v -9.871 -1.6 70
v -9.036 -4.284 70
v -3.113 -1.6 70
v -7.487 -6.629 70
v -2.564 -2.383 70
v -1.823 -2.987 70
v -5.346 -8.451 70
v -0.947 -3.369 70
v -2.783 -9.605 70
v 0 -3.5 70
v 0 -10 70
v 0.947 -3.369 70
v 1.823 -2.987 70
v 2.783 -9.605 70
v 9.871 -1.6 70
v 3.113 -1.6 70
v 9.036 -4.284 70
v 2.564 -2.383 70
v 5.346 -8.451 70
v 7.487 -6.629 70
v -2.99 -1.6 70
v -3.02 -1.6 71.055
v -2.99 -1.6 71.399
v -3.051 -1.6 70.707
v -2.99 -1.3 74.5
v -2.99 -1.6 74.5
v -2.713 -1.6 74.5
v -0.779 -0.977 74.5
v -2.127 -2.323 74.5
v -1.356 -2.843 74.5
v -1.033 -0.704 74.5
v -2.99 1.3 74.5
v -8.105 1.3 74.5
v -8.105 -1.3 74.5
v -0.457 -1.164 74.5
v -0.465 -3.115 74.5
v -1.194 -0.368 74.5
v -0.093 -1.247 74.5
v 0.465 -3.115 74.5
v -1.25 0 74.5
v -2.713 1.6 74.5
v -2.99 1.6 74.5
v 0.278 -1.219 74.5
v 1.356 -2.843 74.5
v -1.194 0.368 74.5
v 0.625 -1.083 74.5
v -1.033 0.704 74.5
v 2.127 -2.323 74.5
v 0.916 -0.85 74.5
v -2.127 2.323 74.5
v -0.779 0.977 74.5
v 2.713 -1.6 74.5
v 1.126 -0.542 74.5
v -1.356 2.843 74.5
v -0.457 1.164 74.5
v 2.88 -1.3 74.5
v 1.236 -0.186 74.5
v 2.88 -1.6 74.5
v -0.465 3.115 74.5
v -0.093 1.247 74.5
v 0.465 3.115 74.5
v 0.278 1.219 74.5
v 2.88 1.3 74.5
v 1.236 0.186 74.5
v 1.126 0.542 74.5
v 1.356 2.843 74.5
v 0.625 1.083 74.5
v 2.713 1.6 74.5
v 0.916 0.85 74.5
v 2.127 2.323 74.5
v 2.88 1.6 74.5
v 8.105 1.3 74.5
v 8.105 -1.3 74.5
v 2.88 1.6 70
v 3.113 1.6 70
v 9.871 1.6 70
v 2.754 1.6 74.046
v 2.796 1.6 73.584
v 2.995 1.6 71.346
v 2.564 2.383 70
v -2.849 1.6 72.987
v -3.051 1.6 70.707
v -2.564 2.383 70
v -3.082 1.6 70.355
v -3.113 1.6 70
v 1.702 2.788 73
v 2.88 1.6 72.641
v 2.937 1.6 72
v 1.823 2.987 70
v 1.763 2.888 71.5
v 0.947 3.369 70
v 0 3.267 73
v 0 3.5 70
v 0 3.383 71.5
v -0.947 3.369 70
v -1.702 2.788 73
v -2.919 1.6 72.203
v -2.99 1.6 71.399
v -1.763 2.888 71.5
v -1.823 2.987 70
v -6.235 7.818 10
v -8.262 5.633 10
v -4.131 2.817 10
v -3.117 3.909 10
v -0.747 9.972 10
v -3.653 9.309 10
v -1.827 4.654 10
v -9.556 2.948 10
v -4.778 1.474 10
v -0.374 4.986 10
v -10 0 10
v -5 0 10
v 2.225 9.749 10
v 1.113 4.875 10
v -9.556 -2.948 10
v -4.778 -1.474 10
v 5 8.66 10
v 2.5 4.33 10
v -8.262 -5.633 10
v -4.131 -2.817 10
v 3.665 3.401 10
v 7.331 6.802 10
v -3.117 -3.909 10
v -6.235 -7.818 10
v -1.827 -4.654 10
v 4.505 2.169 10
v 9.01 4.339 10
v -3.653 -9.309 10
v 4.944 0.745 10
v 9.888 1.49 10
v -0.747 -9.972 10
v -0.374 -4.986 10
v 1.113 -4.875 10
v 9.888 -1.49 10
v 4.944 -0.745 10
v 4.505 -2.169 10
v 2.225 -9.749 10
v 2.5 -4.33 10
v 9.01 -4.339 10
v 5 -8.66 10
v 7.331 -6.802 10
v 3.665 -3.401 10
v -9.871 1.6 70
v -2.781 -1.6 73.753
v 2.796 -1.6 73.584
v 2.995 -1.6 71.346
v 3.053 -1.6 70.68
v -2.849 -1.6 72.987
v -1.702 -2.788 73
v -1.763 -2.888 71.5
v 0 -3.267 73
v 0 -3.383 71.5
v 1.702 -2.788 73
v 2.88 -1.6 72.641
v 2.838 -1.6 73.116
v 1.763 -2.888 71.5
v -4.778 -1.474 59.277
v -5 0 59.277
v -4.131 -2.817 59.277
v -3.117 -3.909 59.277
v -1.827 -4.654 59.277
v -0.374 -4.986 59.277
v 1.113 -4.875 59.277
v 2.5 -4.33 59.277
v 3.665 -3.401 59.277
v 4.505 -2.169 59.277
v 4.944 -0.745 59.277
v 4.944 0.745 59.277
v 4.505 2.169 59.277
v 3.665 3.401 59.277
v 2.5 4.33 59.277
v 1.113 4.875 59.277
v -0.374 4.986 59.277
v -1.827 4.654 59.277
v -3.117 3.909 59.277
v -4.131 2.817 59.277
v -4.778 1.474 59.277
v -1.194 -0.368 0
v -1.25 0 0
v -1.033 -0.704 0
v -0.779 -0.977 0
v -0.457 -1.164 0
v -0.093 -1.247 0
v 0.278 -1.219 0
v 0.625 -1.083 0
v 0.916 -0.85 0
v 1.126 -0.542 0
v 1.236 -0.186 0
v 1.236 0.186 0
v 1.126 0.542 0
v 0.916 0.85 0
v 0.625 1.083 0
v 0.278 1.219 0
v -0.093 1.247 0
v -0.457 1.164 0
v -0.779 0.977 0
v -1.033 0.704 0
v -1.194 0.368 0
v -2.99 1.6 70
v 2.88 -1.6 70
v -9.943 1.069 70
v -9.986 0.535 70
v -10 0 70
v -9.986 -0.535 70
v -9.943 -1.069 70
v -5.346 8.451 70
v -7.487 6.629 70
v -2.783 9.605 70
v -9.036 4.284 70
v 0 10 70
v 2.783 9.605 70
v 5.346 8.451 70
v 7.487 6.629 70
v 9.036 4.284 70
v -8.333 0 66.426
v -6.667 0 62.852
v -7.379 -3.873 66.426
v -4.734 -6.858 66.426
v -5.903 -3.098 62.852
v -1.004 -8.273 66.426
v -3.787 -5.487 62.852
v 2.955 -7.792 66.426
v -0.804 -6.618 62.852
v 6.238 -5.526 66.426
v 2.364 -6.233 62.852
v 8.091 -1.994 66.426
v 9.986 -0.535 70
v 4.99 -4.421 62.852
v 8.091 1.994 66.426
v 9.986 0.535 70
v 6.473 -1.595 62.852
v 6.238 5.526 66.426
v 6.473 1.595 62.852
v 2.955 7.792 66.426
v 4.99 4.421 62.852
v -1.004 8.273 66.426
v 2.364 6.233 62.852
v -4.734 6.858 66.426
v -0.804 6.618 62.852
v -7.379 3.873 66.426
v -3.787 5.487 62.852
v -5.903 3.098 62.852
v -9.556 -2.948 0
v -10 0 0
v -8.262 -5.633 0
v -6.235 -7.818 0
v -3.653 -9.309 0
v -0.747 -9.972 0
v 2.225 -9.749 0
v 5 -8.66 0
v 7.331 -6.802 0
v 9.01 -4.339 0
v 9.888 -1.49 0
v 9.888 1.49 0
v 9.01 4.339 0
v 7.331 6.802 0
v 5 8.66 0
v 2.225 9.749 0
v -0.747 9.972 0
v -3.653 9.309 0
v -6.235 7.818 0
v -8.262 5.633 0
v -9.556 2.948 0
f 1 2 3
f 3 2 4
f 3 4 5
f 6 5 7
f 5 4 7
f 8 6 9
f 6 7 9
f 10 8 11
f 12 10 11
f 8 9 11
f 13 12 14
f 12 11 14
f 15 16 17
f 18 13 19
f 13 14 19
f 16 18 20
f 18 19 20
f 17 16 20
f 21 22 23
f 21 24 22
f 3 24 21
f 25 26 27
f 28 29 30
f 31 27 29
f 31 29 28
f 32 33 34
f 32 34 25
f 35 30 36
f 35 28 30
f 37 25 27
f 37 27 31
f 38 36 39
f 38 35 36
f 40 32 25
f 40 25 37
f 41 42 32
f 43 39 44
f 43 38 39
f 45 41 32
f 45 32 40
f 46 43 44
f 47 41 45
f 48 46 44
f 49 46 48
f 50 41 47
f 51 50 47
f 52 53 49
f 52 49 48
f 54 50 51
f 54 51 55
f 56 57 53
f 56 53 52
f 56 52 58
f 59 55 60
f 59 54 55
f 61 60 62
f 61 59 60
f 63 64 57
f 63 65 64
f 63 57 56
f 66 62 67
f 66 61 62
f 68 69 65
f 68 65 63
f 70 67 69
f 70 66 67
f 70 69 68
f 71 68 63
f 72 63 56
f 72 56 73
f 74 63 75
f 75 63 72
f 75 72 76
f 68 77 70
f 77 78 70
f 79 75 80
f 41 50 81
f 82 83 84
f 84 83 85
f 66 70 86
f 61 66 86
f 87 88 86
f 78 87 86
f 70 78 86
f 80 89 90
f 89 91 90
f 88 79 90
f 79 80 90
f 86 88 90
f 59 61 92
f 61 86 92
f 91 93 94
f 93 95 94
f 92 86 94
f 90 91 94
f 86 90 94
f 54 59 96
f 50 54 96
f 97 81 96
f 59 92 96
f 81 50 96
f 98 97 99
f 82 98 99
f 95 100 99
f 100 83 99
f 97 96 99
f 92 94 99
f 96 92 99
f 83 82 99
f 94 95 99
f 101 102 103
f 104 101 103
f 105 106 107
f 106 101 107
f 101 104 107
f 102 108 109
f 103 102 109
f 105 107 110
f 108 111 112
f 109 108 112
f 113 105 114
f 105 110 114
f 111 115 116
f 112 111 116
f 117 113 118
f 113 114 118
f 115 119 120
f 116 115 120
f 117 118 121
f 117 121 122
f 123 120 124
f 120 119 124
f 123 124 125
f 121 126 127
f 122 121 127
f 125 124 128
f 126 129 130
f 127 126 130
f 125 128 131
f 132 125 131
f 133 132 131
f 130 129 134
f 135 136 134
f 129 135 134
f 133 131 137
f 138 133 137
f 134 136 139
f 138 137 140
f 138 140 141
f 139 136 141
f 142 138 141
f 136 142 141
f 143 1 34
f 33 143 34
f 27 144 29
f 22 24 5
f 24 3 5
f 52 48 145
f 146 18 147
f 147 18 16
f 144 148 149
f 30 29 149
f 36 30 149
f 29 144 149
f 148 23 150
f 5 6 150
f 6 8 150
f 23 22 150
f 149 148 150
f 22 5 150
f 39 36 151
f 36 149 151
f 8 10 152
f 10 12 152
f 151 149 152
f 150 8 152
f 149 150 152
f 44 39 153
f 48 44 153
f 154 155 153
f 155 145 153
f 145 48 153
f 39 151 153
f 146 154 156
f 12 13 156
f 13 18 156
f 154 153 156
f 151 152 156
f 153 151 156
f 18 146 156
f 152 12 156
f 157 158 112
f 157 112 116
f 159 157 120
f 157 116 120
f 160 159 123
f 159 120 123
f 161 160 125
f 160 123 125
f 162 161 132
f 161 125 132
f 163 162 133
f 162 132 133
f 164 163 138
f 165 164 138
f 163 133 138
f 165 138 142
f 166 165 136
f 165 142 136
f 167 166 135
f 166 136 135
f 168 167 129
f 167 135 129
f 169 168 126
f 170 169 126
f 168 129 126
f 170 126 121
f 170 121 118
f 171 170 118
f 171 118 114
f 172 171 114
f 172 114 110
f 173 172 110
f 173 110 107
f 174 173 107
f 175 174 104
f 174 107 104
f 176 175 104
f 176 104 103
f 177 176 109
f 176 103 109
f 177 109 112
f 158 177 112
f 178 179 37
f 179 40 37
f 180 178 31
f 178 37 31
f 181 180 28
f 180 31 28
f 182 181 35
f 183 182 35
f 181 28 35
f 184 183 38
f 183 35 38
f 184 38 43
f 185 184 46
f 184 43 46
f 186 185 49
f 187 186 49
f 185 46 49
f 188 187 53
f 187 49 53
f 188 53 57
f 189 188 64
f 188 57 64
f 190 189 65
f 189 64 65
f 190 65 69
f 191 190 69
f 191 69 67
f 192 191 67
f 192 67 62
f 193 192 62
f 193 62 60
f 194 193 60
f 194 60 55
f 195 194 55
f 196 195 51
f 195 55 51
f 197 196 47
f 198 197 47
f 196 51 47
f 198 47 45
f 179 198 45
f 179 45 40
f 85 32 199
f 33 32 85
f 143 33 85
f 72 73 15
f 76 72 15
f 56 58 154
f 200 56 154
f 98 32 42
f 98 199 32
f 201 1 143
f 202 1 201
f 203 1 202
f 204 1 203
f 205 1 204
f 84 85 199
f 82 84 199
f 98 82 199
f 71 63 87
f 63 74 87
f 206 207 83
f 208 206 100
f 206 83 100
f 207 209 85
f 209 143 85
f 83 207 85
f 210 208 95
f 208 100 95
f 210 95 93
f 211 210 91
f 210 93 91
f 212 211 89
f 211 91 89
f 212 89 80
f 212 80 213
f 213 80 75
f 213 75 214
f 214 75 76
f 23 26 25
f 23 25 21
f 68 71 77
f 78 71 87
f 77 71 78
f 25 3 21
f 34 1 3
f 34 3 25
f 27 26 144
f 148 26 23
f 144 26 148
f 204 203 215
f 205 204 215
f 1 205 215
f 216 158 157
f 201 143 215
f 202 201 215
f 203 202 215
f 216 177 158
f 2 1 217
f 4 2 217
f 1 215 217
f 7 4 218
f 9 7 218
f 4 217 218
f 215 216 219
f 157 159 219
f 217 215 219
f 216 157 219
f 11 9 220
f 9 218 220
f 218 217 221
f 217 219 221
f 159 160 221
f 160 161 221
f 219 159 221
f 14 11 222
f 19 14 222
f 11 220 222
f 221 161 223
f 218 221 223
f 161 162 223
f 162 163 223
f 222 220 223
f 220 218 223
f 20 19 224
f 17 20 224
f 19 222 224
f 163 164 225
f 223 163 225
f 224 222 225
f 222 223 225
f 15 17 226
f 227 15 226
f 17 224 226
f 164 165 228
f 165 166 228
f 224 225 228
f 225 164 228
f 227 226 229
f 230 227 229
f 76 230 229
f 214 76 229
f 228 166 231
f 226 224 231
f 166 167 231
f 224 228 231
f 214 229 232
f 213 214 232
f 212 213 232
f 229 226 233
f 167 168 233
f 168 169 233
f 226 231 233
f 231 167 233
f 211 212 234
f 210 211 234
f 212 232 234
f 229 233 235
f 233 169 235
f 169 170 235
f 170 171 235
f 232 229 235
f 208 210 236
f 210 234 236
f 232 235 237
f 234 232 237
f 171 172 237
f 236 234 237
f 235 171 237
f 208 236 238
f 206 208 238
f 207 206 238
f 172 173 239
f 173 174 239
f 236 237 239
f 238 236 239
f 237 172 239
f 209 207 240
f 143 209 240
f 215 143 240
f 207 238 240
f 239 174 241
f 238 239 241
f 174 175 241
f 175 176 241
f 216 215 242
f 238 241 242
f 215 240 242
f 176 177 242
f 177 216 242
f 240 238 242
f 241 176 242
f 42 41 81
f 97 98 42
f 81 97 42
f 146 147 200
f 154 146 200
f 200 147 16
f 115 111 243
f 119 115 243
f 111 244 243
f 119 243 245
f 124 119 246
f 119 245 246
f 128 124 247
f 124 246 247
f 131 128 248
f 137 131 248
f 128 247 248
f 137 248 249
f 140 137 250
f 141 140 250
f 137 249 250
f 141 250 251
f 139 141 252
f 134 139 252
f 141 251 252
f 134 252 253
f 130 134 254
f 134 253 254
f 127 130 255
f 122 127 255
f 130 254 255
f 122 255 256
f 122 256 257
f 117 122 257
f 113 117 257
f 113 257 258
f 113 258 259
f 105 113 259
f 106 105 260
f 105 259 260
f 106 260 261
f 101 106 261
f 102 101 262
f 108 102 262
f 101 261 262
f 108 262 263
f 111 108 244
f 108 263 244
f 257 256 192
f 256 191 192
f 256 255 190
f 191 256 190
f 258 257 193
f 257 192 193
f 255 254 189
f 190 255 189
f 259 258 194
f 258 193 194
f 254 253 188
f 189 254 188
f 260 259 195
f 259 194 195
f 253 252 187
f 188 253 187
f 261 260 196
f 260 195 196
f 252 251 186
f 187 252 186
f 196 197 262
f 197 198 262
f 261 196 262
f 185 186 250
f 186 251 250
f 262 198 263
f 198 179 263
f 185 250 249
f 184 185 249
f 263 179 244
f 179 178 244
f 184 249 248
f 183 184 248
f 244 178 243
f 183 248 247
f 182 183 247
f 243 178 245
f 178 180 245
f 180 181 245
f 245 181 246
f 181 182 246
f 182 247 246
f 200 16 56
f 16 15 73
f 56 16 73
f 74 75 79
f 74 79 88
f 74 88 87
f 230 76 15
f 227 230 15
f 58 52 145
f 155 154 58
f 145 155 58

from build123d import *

# Parameters (mm, degrees)
F3_DEPTH  = 4.5
F6_DEPTH  = 7.82
F9_DEPTH  = 7.71
F12_DEPTH = 25


with BuildPart() as f1:
    # F0 (on Front) → F1 (revolve)
    with BuildSketch(Plane.XZ):
        Polygon((-10, 0), (-1.25, 0), (-1.25, 74.5), (-3.15, 74.5), (-3.5, 70), (-10, 70), (-5, 59.2774653975), (-5, 10), (-10, 10), align=None)
    revolve(axis=Axis((0, 0, 54.2438514531), (0, 0, 1)))

    # F2 (on face) → F3 (join)
    with BuildSketch(Plane.XY.offset(70)):
        with BuildLine():
            Line((-3.1128764833, 1.6), (-9.8711701434, 1.6))
            ThreePointArc((-9.8711701434, 1.6), (-10, 0), (-9.8711701434, -1.6))
            Line((-9.8711701434, -1.6), (-3.1128764833, -1.6))
            Line((-3.1128764833, -1.6), (-2.7133927102, -1.6))
            ThreePointArc((-2.7133927102, -1.6), (-3.15, 0), (-2.7133927102, 1.6))
            Line((-2.7133927102, 1.6), (-3.1128764833, 1.6))
        make_face()
        with BuildLine():
            Line((9.8711701434, 1.6), (3.1128764833, 1.6))
            Line((3.1128764833, 1.6), (2.7133927102, 1.6))
            ThreePointArc((2.7133927102, 1.6), (3.15, 0), (2.7133927102, -1.6))
            Line((2.7133927102, -1.6), (3.1128764833, -1.6))
            Line((3.1128764833, -1.6), (9.8711701434, -1.6))
            ThreePointArc((9.8711701434, -1.6), (10, 0), (9.8711701434, 1.6))
        make_face()
    extrude(amount=F3_DEPTH)

    # F5 (on offset) → F6 (cut)
    with BuildSketch(Plane.YZ.offset(10.7)):
        Polygon((-1.6, 70), (-1.3, 74.5), (-1.6, 74.5), align=None)
        Polygon((1.6, 74.5), (1.3, 74.5), (1.6, 70), align=None)
    extrude(amount=-F6_DEPTH, mode=Mode.SUBTRACT)

    # F8 (on offset) → F9 (cut)
    with BuildSketch(Plane.YZ.offset(-10.7)):
        Polygon((1.6, 70), (1.6, 74.5), (1.3, 74.5), align=None)
        Polygon((-1.3, 74.5), (-1.6, 74.5), (-1.6, 70), align=None)
    extrude(amount=F9_DEPTH, mode=Mode.SUBTRACT)

    # F11 (on offset) → F12 (cut)
    with BuildSketch(Plane.XZ.offset(10)):
        Polygon((-10.2594941854, 70), (-9.8711701434, 70), (-7.9456651583, 74.9055147171), (-10.5508649722, 74.9055147171), align=None)
        Polygon((7.9456651583, 74.9055147171), (9.8711701434, 70), (10.2594941854, 70), (10.5508649722, 74.9055147171), align=None)
    extrude(amount=-F12_DEPTH, mode=Mode.SUBTRACT)


solid = f1.part
